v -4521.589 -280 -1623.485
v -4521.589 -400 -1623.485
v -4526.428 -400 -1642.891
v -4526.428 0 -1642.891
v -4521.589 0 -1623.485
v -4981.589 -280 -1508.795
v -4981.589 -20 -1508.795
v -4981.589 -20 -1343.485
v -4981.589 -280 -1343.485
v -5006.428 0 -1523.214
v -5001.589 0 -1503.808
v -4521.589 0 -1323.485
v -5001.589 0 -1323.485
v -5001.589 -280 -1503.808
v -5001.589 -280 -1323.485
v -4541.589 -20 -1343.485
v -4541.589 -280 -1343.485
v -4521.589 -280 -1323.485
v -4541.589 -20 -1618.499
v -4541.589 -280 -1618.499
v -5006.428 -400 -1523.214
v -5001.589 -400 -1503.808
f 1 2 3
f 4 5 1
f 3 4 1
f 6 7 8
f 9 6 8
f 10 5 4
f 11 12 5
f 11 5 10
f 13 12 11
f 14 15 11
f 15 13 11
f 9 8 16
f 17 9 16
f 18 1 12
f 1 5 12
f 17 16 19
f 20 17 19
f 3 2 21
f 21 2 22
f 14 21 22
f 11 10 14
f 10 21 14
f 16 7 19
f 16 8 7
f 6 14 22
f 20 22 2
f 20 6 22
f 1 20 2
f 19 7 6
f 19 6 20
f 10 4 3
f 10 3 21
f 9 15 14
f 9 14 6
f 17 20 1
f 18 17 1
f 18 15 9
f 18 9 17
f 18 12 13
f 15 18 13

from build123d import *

# Parameters (mm, degrees)
F1_DEPTH = 20
F3_DEPTH = 260
F5_DEPTH = 400


with BuildPart() as f1:
    # F0 (on Front) → F1 (new body)
    with BuildSketch(Plane.XZ):
        Polygon((-4521.589086, -1323.485495), (-5001.589086, -1323.485495), (-5001.589086, -1503.808054), (-4521.589086, -1623.485495), align=None)
    extrude(amount=F1_DEPTH)

    # F2 (on face) → F3 (join)
    with BuildSketch(Plane.XZ.offset(20)):
        Polygon((-4521.589086, -1323.485495), (-5001.589086, -1323.485495), (-5001.589086, -1503.808054), (-4981.589086, -1508.794614), (-4981.589086, -1343.485495), (-4541.589086, -1343.485495), (-4541.589086, -1618.498935), (-4521.589086, -1623.485495), align=None)
    extrude(amount=F3_DEPTH)

    # F4 (on face) → F5 (join)
    with BuildSketch(Plane(origin=(0, 0, 0), x_dir=(-1, 0, 0), z_dir=(0, 1, 0))):
        Polygon((5006.427524, -1523.213969), (5001.589086, -1503.808054), (4521.589086, -1623.485495), (4526.427524, -1642.89141), align=None)
    extrude(amount=-F5_DEPTH)


solid = f1.part
